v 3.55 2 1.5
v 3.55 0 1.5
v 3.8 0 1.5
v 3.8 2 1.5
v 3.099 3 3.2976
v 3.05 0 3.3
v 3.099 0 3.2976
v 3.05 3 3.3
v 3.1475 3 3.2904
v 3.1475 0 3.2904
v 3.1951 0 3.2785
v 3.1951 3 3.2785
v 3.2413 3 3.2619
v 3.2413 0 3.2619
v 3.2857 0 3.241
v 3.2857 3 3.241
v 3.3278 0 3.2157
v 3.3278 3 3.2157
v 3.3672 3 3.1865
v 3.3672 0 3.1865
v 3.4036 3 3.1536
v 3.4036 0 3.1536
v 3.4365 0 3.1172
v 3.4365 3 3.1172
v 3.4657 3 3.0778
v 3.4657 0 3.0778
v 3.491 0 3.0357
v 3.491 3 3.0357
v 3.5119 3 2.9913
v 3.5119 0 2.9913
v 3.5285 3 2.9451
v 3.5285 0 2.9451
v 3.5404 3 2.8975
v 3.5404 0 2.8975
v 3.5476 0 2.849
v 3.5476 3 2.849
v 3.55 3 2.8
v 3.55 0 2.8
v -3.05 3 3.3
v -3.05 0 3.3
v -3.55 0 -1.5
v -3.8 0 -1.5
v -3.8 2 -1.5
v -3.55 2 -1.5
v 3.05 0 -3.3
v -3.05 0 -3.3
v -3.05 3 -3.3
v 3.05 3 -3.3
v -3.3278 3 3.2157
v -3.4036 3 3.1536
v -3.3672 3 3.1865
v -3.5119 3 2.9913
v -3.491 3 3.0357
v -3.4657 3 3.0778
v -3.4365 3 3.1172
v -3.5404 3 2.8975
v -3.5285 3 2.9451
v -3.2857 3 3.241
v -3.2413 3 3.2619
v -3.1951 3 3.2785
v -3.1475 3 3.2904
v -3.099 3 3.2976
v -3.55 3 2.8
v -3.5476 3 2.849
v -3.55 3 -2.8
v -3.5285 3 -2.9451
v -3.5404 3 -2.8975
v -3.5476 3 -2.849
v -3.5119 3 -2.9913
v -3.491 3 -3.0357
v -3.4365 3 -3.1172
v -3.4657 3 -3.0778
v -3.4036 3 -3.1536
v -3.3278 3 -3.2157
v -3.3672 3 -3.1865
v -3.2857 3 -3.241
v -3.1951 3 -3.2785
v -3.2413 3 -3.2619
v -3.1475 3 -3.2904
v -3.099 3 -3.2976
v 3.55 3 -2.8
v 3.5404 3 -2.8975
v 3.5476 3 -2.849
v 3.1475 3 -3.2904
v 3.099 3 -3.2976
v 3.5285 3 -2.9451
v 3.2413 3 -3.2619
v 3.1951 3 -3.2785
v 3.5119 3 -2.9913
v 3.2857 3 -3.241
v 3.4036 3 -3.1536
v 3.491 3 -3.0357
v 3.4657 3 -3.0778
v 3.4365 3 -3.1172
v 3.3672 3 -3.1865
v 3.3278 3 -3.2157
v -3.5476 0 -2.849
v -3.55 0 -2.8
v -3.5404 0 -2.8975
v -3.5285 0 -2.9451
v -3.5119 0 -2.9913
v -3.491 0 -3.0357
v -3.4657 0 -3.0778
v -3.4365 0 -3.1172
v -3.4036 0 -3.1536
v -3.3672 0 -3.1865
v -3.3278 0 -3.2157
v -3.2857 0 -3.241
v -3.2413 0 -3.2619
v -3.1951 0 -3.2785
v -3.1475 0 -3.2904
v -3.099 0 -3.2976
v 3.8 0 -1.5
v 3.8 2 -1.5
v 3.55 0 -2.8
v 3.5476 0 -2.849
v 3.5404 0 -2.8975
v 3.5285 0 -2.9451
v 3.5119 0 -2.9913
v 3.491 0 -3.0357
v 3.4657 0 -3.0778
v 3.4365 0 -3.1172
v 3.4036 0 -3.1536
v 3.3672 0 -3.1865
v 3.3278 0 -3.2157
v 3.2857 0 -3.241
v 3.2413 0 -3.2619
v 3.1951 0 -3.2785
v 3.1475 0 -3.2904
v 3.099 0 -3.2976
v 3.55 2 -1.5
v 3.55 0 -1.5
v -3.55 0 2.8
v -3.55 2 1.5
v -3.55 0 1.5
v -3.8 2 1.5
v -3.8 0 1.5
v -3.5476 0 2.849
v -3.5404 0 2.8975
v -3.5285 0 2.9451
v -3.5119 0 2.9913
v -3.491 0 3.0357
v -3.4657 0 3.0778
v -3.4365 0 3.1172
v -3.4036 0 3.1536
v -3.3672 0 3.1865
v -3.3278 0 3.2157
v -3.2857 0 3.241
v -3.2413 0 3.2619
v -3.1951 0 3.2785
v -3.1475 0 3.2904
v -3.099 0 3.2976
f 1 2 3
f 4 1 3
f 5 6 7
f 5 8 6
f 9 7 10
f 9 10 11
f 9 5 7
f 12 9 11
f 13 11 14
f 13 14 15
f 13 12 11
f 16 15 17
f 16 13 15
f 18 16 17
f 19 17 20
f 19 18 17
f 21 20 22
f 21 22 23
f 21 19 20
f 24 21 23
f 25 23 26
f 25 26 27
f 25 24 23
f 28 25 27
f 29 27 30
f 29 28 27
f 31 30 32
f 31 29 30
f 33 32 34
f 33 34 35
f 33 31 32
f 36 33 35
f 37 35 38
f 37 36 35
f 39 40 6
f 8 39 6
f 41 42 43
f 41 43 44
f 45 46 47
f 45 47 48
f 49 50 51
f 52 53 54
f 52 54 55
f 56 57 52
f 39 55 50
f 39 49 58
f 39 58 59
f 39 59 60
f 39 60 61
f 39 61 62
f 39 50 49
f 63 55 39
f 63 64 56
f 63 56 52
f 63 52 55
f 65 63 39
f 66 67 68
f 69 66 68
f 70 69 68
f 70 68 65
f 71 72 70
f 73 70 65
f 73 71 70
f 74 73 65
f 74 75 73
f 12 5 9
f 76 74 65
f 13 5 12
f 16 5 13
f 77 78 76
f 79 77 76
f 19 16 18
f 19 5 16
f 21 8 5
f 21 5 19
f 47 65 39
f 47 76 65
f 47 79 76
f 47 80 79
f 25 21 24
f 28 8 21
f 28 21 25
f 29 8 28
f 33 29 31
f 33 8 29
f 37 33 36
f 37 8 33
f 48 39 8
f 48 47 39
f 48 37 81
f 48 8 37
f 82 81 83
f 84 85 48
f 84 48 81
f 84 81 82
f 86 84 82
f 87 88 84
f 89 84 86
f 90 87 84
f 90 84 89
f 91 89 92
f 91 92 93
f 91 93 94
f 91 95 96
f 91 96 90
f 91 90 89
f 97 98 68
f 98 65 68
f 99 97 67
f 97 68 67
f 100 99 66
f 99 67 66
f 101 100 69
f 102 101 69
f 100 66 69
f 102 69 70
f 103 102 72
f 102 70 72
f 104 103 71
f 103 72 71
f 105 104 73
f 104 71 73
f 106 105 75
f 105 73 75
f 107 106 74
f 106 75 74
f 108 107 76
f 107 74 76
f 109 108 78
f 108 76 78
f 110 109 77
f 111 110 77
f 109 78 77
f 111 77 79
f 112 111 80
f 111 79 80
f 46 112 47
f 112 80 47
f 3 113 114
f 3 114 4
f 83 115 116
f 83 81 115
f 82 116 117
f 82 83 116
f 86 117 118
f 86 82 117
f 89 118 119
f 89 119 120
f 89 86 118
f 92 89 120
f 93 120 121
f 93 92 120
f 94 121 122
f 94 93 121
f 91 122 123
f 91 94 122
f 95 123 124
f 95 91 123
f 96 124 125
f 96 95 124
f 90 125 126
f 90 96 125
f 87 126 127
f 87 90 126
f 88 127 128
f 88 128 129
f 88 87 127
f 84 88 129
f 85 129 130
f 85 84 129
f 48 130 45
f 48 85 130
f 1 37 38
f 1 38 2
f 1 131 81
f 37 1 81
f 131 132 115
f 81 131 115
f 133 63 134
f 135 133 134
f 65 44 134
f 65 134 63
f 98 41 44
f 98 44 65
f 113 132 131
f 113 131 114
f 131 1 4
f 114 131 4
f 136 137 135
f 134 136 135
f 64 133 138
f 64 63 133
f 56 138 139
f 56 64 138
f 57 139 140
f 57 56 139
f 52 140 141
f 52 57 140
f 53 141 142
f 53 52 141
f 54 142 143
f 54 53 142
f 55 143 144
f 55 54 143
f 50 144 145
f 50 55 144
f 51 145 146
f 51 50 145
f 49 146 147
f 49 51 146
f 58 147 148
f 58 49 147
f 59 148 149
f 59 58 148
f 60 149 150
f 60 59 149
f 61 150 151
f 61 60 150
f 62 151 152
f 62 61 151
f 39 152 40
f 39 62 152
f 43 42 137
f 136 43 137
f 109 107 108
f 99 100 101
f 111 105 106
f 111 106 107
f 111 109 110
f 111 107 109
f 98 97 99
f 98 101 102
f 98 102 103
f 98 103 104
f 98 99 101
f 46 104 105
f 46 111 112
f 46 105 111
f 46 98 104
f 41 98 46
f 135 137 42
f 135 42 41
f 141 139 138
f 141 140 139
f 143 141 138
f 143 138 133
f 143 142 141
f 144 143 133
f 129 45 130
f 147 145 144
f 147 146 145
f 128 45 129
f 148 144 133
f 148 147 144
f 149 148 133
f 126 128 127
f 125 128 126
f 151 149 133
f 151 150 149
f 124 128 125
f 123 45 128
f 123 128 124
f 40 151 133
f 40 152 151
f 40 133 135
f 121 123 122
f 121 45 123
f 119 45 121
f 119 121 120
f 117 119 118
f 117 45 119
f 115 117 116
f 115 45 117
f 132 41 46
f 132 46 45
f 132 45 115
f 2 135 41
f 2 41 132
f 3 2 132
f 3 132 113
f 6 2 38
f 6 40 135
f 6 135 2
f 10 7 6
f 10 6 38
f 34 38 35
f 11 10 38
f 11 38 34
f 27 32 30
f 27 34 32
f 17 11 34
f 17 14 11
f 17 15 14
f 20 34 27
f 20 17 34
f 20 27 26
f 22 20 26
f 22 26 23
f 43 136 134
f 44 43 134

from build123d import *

# Parameters (mm, degrees)
SKETCH_1_W      = 7.1
SKETCH_1_H      = 6.6
EXTRUDE_1_DEPTH = 3
FILLET_1_R      = 0.5
SKETCH_2_W      = 0.5
SKETCH_2_H      = 3
EXTRUDE_2_DEPTH = 2


with BuildPart() as part:
    # 草图1 → 凸台-拉伸1 (new body)
    with BuildSketch(Plane(origin=(0, 0, 0), x_dir=(1, 0, 0), z_dir=(0, 1, 0))):
        Rectangle(SKETCH_1_W, SKETCH_1_H)
    extrude(amount=EXTRUDE_1_DEPTH)

    # 圆角1
    fillet_1_edges = [part.edges().sort_by_distance(p)[0] for p in [
        (3.55, 1.5, 3.3),
        (-3.55, 1.5, 3.3),
        (-3.55, 1.5, -3.3),
        (3.55, 1.5, -3.3),
    ]]
    fillet(fillet_1_edges, radius=FILLET_1_R)

    # 草图2 → 凸台-拉伸2 (add)
    with BuildSketch(Plane.XZ):
        with Locations((-3.55, 0)):
            Rectangle(SKETCH_2_W, SKETCH_2_H)
        with Locations((3.55, 0)):
            Rectangle(SKETCH_2_W, SKETCH_2_H)
    extrude(amount=-EXTRUDE_2_DEPTH)


solid = part.part
